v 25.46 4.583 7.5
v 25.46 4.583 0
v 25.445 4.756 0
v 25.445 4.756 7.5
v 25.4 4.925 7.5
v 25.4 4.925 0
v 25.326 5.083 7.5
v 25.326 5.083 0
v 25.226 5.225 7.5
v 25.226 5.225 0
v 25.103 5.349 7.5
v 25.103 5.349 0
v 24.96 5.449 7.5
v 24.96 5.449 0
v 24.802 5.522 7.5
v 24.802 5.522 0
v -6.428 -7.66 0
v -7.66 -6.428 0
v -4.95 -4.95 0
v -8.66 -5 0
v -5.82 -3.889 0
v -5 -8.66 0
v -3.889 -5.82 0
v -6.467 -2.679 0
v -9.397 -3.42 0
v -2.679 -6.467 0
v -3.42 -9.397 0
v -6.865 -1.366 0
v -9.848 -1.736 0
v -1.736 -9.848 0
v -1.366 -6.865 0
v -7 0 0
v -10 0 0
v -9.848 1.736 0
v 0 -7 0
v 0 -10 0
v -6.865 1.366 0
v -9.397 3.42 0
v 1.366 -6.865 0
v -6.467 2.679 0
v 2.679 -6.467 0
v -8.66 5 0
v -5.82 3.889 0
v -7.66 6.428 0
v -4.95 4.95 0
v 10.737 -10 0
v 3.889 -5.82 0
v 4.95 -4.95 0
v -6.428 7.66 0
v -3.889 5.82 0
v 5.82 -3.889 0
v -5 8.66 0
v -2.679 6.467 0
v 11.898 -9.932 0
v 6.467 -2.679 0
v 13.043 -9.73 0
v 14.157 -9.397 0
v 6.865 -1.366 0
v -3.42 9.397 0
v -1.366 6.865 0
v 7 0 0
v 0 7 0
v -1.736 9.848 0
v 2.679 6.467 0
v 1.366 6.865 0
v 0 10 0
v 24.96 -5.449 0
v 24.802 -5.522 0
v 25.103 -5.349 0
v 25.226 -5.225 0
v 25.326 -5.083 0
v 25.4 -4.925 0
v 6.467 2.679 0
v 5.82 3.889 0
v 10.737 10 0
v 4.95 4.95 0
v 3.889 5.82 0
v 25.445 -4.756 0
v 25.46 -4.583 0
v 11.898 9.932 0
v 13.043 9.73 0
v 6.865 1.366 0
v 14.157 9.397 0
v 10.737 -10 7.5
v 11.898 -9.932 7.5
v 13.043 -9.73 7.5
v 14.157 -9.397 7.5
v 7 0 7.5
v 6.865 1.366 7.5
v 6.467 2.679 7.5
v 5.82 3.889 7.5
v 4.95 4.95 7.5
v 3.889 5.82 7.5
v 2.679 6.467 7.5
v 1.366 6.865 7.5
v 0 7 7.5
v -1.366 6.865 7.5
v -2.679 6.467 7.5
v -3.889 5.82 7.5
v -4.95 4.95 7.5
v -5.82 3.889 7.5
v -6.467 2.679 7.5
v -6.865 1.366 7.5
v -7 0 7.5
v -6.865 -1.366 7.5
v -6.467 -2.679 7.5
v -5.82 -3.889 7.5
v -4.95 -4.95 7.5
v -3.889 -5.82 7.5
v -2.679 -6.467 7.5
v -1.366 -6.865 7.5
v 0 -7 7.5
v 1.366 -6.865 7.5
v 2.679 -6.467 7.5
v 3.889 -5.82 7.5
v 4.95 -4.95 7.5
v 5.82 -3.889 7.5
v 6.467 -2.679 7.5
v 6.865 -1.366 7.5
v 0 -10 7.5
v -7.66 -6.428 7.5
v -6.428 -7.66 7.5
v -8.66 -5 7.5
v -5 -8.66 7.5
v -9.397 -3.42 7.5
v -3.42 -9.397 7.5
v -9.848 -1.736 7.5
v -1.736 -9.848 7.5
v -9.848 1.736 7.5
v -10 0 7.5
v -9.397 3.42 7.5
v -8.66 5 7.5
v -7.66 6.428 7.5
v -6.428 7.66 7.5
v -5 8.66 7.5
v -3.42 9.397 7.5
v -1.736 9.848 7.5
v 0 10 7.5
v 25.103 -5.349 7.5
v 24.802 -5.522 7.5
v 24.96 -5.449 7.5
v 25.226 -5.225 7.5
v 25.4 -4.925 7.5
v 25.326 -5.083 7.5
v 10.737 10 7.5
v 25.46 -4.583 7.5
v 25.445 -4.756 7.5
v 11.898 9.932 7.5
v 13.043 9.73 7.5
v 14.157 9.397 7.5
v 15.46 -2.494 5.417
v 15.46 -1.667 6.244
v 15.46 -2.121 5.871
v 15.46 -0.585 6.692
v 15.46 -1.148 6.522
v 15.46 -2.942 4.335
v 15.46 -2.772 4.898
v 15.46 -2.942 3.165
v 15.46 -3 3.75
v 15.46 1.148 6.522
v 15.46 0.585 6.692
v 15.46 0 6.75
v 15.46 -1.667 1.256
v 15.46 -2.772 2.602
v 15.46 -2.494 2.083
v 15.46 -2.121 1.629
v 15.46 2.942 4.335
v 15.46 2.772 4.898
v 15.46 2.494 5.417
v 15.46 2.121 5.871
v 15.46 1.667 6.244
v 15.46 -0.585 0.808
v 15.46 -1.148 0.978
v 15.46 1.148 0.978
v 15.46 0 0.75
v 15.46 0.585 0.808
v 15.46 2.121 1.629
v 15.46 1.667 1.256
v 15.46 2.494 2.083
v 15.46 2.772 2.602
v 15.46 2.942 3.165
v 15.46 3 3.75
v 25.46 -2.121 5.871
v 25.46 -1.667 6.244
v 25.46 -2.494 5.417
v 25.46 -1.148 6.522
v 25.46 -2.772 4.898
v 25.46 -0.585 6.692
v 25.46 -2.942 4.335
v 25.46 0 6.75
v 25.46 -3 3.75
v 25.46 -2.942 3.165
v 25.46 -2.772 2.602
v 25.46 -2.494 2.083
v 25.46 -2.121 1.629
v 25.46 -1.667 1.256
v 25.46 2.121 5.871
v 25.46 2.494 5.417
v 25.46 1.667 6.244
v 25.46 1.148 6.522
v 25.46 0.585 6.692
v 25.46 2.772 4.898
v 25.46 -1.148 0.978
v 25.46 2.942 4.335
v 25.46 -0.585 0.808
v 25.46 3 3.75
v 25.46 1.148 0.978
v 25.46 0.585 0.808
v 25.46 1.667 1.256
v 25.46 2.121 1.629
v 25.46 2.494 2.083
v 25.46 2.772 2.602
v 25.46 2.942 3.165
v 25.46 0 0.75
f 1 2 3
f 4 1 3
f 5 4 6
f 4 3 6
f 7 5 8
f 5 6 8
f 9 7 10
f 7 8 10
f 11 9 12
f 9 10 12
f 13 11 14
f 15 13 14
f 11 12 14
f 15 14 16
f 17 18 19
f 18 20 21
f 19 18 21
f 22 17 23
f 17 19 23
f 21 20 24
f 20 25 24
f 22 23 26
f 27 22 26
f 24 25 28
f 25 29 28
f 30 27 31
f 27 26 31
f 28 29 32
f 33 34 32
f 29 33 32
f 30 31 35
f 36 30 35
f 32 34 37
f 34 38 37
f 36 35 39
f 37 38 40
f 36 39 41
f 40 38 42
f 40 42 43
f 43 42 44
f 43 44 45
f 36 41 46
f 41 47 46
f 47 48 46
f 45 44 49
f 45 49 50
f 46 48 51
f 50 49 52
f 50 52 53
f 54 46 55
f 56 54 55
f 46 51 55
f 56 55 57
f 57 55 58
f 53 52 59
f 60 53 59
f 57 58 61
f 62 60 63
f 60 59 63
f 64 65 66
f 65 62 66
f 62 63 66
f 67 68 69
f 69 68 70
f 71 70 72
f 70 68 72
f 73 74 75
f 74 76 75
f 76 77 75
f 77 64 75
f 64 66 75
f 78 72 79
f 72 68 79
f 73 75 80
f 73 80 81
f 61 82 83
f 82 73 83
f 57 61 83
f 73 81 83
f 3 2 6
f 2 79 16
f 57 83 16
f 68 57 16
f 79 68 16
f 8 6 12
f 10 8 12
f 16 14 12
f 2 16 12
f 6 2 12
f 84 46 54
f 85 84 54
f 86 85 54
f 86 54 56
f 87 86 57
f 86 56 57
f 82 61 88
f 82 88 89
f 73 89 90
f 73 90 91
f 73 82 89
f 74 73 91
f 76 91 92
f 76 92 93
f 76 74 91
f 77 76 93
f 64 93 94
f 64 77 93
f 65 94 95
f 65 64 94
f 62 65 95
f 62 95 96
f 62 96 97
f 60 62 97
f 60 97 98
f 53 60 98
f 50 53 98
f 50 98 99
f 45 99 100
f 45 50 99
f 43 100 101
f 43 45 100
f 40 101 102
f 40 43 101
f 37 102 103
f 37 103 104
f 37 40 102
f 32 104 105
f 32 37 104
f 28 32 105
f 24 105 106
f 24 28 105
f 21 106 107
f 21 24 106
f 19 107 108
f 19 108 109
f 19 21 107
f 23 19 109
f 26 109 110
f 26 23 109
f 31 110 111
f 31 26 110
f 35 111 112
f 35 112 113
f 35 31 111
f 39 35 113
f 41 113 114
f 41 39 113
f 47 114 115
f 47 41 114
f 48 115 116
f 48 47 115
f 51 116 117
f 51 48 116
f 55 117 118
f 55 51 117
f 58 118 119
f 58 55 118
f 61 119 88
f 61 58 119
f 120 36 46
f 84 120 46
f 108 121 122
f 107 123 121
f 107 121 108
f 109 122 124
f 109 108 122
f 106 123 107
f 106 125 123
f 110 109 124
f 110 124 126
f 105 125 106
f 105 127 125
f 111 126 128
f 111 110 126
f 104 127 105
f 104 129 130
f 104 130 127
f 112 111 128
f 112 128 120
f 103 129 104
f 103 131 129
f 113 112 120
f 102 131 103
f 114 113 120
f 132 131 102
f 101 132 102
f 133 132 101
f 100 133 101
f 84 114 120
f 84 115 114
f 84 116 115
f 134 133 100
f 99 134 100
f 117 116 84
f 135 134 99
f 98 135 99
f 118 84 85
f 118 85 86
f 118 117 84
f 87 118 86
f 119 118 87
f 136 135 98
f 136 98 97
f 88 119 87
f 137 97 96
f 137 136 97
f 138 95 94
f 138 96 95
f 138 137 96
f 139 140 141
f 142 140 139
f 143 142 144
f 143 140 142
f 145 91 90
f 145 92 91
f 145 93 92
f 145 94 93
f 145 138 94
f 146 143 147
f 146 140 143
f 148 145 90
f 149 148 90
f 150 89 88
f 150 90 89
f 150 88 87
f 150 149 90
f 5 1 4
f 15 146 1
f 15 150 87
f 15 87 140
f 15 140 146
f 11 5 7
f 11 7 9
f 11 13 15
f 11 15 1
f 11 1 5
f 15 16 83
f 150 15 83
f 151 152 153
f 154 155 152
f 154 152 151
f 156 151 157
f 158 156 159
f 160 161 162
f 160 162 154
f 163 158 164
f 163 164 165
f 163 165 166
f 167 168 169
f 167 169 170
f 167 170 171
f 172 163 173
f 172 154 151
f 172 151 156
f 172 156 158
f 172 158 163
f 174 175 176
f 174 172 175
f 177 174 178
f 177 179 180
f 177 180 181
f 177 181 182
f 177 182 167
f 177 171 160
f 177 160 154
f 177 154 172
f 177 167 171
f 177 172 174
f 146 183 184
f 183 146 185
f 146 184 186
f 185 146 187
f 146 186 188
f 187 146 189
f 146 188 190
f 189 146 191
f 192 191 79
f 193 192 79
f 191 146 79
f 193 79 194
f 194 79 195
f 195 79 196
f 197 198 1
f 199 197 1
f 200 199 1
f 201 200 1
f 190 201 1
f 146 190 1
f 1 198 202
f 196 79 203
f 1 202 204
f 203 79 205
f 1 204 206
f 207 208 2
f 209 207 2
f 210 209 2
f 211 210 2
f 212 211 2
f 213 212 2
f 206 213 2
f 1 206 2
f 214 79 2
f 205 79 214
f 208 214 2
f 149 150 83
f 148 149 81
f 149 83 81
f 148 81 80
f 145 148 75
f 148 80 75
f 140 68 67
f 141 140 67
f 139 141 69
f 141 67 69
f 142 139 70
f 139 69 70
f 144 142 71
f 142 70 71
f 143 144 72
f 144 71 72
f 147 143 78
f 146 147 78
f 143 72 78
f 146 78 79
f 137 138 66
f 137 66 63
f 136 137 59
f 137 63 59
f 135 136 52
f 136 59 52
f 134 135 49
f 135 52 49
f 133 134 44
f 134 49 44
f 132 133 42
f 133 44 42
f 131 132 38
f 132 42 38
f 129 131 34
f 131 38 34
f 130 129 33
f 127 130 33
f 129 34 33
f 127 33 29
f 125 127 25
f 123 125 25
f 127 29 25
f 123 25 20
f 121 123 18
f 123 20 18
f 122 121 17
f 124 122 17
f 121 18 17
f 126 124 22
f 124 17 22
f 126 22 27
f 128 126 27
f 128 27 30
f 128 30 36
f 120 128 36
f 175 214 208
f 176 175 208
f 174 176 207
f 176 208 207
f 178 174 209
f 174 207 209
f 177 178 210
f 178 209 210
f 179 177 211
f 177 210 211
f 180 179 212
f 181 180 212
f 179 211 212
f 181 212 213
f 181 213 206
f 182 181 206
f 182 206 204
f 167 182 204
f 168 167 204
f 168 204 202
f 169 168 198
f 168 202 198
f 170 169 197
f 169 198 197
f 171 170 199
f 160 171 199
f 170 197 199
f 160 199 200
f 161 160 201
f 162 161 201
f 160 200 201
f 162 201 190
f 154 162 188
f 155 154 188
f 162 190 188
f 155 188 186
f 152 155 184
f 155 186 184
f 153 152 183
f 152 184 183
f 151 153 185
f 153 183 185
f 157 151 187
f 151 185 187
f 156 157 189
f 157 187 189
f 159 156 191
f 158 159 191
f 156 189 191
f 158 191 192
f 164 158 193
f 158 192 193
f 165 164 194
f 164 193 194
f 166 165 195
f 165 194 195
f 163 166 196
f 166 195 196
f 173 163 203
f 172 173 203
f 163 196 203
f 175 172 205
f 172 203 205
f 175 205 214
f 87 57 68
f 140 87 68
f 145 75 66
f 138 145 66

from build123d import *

# Parameters (mm, degrees)
SKETCH1_R           = 7
BOSS_EXTRUDE1_DEPTH = 7.5
SKETCH2_R           = 3
CUT_EXTRUDE1_DEPTH  = 10


with BuildPart() as part:
    # Sketch1 → Boss-Extrude1 (new body)
    with BuildSketch(Plane.XY):
        with BuildLine():
            Line((25.460451105, -4.582574037), (25.460451105, 4.582574037))
            ThreePointArc((25.460451105, 4.582574037), (25.279603149, 5.156150473), (24.802471248, 5.522266658))
            Line((24.802471248, 5.522266658), (14.156931626, 9.396926208))
            ThreePointArc((14.156931626, 9.396926208), (12.47321197, 9.84807753), (10.736730193, 10))
            Line((10.736730193, 10), (0, 10))
            ThreePointArc((0, 10), (-10, 0), (0, -10))
            Line((0, -10), (10.736730193, -10))
            ThreePointArc((10.736730193, -10), (12.47321197, -9.84807753), (14.156931626, -9.396926208))
            Line((14.156931626, -9.396926208), (24.802471248, -5.522266658))
            ThreePointArc((24.802471248, -5.522266658), (25.279603149, -5.156150473), (25.460451105, -4.582574037))
        make_face()
        Circle(SKETCH1_R, mode=Mode.SUBTRACT)
    extrude(amount=BOSS_EXTRUDE1_DEPTH)

    # Sketch2 → Cut-Extrude1 (cut)
    with BuildSketch(Plane(origin=(25.460451105, 0, 0), x_dir=(0, 0, -1), z_dir=(1, 0, 0))):
        with Locations((-3.75, 0)):
            Circle(SKETCH2_R)
    extrude(amount=-CUT_EXTRUDE1_DEPTH, mode=Mode.SUBTRACT)


solid = part.part
